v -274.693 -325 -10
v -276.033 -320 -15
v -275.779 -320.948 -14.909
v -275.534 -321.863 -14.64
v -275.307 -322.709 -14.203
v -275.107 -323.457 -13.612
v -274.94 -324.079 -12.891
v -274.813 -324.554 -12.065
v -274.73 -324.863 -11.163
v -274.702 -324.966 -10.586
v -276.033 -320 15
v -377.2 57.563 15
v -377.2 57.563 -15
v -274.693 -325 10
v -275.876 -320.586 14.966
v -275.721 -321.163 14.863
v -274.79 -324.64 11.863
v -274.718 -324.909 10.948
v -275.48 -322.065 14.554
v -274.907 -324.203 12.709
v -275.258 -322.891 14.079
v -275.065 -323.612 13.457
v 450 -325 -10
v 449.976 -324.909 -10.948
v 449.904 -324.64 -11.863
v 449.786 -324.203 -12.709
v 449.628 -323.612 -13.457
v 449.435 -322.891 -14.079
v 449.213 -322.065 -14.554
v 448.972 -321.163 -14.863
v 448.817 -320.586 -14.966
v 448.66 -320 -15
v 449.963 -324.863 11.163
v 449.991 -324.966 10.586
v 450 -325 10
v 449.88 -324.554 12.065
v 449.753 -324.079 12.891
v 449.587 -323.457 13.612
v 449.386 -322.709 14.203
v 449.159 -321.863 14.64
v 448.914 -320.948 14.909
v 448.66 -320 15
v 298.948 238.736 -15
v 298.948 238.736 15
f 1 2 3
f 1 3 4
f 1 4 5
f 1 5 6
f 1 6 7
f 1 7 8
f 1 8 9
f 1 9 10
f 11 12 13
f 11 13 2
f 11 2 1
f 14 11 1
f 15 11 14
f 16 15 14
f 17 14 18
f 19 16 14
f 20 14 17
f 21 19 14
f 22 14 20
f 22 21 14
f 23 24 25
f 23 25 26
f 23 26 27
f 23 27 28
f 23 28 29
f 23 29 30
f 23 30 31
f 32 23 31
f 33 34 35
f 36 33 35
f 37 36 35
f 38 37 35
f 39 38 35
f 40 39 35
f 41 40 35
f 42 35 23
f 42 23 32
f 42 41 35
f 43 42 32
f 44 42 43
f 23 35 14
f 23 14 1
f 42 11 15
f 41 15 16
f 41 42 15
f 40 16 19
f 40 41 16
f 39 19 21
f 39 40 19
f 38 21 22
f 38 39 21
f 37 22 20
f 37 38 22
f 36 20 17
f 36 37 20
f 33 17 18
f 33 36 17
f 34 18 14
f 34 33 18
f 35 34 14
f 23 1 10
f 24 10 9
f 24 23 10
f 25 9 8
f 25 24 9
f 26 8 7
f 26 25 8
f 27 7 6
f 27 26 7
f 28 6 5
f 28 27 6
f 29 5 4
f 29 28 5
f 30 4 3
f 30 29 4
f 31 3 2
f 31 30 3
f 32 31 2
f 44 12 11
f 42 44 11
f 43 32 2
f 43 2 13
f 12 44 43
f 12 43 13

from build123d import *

# Parameters (mm, degrees)
F2_DEPTH = 500
F3_DEPTH = 50


with BuildPart() as f2:
    # F0 (on Right) → F2 (new body, symmetric)
    with BuildSketch(Plane.YZ):
        with BuildLine():
            Line((325, -15), (325, 15))
            Line((325, 15), (-320, 15))
            ThreePointArc((-320, 15), (-323.5355339059, 13.5355339059), (-325, 10))
            Line((-325, 10), (-325, -10))
            ThreePointArc((-325, -10), (-323.5355339059, -13.5355339059), (-320, -15))
            Line((-320, -15), (325, -15))
        make_face()
    extrude(amount=F2_DEPTH, both=True)

    # F1 (on Top) → F3 (intersect, symmetric)
    with BuildSketch(Plane.XY):
        Polygon((-377.2004181072, 57.5629813311), (-222.5983966751, -519.420954832), (453.5497866996, -338.2480150228), (298.9477652675, 238.7359211403), align=None)
    extrude(amount=F3_DEPTH, both=True, mode=Mode.INTERSECT)


solid = f2.part
